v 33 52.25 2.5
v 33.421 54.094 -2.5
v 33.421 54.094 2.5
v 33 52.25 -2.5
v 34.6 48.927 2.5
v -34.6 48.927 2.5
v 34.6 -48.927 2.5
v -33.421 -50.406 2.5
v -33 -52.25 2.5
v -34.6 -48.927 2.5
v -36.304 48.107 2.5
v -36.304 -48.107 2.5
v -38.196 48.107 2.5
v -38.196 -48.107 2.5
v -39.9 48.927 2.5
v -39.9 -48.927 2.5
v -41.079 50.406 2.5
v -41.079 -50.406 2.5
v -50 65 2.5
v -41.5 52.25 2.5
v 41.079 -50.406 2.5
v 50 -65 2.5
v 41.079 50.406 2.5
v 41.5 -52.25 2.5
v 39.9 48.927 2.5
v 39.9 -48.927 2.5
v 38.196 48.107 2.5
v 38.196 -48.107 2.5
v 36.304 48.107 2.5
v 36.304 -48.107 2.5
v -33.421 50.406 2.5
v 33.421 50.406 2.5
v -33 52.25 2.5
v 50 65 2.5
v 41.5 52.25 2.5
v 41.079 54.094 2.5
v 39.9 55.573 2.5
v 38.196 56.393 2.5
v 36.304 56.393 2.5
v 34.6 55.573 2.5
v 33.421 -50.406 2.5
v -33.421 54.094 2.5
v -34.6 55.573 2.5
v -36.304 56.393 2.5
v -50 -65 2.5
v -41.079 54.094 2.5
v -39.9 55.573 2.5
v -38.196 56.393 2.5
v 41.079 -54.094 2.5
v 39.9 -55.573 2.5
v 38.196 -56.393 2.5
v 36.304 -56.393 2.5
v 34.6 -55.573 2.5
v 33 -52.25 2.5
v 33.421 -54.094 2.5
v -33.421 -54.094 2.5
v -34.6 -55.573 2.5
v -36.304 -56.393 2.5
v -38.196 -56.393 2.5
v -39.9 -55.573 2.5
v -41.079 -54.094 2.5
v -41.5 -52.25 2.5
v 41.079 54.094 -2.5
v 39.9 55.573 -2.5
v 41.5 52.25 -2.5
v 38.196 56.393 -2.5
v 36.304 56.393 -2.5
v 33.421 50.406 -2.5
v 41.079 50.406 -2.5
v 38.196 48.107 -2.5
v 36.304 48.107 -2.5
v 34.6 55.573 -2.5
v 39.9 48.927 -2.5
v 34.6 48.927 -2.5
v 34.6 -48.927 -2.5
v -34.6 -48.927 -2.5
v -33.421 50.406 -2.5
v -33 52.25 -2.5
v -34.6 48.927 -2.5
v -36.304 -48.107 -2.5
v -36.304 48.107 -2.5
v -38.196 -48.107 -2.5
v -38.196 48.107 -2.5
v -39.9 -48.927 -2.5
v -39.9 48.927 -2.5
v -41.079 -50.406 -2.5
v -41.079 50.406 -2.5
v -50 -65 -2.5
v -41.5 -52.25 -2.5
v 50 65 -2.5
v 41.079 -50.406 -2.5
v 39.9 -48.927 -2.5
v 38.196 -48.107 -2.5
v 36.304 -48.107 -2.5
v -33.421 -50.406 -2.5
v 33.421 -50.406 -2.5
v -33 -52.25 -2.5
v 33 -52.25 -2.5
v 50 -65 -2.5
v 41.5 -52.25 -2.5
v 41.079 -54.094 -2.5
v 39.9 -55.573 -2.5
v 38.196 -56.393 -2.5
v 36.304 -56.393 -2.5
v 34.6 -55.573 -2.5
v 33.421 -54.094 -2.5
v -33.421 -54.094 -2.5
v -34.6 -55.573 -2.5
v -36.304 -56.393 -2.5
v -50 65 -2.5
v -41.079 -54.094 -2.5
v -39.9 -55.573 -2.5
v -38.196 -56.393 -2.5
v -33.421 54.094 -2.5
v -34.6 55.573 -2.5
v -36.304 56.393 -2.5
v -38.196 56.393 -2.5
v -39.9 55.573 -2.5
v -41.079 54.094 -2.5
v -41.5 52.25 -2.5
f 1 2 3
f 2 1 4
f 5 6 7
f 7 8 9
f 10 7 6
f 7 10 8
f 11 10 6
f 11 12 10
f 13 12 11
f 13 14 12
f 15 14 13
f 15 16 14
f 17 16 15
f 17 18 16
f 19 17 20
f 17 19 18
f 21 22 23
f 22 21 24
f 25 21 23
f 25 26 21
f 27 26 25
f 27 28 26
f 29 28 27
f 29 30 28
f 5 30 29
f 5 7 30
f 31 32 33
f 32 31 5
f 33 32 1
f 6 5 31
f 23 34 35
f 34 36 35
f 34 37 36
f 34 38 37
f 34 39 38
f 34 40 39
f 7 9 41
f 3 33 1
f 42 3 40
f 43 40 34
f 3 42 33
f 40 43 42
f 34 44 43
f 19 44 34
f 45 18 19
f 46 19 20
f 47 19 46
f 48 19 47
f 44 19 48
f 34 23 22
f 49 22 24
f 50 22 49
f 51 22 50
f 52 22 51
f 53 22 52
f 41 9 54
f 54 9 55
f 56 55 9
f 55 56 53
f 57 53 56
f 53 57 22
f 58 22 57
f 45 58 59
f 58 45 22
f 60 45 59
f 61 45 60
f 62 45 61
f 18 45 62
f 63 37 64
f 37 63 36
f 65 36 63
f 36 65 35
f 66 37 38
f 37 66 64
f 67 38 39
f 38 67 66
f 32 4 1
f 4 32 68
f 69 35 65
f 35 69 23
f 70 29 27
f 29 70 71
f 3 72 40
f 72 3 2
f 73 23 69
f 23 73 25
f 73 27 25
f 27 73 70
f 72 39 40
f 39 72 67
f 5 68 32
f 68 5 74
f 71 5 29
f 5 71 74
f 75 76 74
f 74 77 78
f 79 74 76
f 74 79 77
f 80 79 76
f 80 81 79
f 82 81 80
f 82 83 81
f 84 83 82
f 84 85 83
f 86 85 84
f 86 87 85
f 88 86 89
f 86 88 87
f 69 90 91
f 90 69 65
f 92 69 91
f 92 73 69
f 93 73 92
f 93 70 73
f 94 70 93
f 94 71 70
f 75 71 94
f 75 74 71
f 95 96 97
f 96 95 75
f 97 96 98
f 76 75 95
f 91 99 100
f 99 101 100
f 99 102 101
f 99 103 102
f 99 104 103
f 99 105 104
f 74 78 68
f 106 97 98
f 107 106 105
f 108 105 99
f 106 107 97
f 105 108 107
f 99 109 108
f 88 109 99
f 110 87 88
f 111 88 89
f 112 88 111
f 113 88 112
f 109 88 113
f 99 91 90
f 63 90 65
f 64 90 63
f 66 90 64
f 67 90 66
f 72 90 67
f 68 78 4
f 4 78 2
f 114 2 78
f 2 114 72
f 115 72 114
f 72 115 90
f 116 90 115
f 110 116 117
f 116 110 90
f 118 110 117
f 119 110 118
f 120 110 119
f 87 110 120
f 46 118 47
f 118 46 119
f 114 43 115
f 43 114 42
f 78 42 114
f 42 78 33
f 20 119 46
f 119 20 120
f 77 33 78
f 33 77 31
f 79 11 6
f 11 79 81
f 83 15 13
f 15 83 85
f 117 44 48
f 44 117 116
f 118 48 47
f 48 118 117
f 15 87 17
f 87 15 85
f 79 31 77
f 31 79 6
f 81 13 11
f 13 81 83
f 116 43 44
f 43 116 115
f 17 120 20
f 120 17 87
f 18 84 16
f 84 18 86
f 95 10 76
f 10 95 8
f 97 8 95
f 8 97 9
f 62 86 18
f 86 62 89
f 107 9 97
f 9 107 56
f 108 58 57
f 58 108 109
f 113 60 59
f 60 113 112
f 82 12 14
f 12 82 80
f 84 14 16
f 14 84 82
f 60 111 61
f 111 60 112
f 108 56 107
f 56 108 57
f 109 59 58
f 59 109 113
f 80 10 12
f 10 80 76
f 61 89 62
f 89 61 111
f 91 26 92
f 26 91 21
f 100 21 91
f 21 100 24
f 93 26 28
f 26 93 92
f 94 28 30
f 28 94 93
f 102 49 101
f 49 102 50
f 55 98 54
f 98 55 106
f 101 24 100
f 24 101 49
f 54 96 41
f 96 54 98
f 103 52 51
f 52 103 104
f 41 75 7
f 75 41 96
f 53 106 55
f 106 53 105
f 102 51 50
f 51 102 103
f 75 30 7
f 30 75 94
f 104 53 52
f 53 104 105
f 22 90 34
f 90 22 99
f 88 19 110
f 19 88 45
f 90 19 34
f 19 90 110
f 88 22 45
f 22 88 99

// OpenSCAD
// Generated by SolidPython 1.1.3 on 2023-10-11 16:42:55


difference() {
	cube(center = true, size = [100, 130.0000000000, 5]);
	union() {
		translate(v = [37.2500000000, 52.2500000000]) {
			cylinder(center = true, h = 5, r = 4.2500000000);
		}
		translate(v = [-37.2500000000, 52.2500000000]) {
			cylinder(center = true, h = 5, r = 4.2500000000);
		}
		translate(v = [-37.2500000000, -52.2500000000]) {
			cylinder(center = true, h = 5, r = 4.2500000000);
		}
		translate(v = [37.2500000000, -52.2500000000]) {
			cylinder(center = true, h = 5, r = 4.2500000000);
		}
	}
}
/***********************************************
*********      SolidPython code:      **********
************************************************
 
import solid
import numbers
import pudb
from solid.utils import *
import viewscad
import subprocess
import os
import os.path as osp
import math
import sys

chamfer_extrude=solid.import_scad("./chamfer_extrude.scad")
chamfer_extrude=chamfer_extrude.chamfer_extrude
r = viewscad.Renderer(width=800, height=800)

def debug(model,f_name,path="/home/ts/code/projects/mfd/designs/debug"):
    solid.scad_render_to_file(model,osp.join(path,f_name)+".scad")
#generate position list of wells using offset from center
wells_pos_from_center_4 = lambda offset: [[-offset,offset],
                                        [offset, offset],
                                        [-offset, -offset],
                                        [offset, -offset]]
#wells_pos_from_center_2 = lambda offset: [[0,offset],
#                                        [0, -offset]]
wells_pos_from_center_2 = lambda offset: [[offset,0],
                                        [-offset,0]]

def make_well(dims,shape=None,height=None,dxf=False):
    def circle_cylinder():
        if dxf or (height is None):
            well = solid.circle(r=dims, segments=64)
        else:
            well = solid.cylinder(r=dims, h=height, segments=64, center = True)
        return well
    if dims is None:
        sys.exit("radius needs to be a number")
    if isinstance(dims, numbers.Number):
        well =circle_cylinder()
    elif len(dims)==1:
        if isinstance(dims[1], numbers.Number):
            well =circle_cylinder()
        else:
            sys.exit("radius needs to be a number")
    elif len(dims)==2:
        well = solid.square(dims,center = True)
    elif len(dims)==3:
        well = solid.cube(dims, center = True)
    return well

def wells_top_bottom(center_gap,device_dims=None,shape=None,height=None, positions = None, dxf = False):
    well_shape = make_well(device_dims,shape=shape,height=height,dxf=dxf)
    wells = []
    if positions is None:
        offset = radius+radius/2.0
        positions = wells_pos_from_center_2(offset)
    if dxf or (height is None):
        height = 0
    for position in positions:
        if dxf:
            wells.append(solid.translate([position[0],position[1]])(well_shape))
        else:
            wells.append(solid.translate([position[0],position[1],height/2.0])(well_shape))
    return  union()(*wells)

#place wells in four corners 
def four_corner(radius,height=None, positions = None, dxf = False):
    #if well pos not specified set
    #to equally spaced by half radius
    if positions is None:
        offset = radius+radius/2.0
        positions = wells_pos_from_center_4(offset)
    if dxf or (height is None):
        height = 0
    #make wells at positions with specified radius and height
    wells = []
    for position in positions:
        #make circle if making dxf
        if dxf:
            well_shape = solid.circle(r=radius, segments=64)
            well_shape = solid.translate([position[0],position[1]])(well_shape)
        #if stl make cylinder
        else:
            well_shape = solid.cylinder(r=radius, h=height, segments=64, center = True)
            well_shape = solid.translate([position[0],position[1],height/2.0])(well_shape)
        wells.append(well_shape)
    return  union()(*wells)

#generate channels 
def make_channels(length,width,height=0,num_chans=1,max_chans=None,spacing=None, dxf = False,
                  rotate_channels=False):
    if dxf or (height is None):
        height = 0
    #if channel gap not defined, is equal to
    if spacing is None: spacing = width
    #calculate number of channels if fitting max num within given width
    if not max_chans is None:
        import math
        num_chans = math.floor((max_chans-spacing)/(width+spacing))
    #get total width of channel section  
    total_width = (width*num_chans)+(spacing*(num_chans-1))

    #make template channel
    #if rotate_channels: width, length = length, width
    if dxf:
        channel_t = solid.square([length,width],center = True)
    else:
        channel_t = solid.cube([length,width,height], center = True)

    #if number channels is even, offset the first channel to center its gap
    if num_chans % 2 == 0: centering = -(width/2.0+spacing/2.0)
    else: centering = 0
    #move template channel up to align bottom at z = 0 
    #and offset center if necessary
    if dxf:
        channel_t = solid.translate([0,centering])(channel_t)
    else:
        channel_t = solid.translate([0,centering,height/2.0])(channel_t)

    #if rotate_channels: length,width = width,length
    #start making the channels
    channels = []
    for i in range(num_chans):
        #if i=0 there is no translation
        #if i=1, we make the first channel adjacent to second
        direction = i

        #if i>=1, we add channels alternating left and right
        if i >= 1:
            direction = -(i/2.0)
            if i % 2 == 1: direction = (-direction)+0.5
                
        #make channel at right position and add it to channel list
        translation_coords = [0,direction*(width+spacing)]
        #if rotate_channels: translation_coords = [direction*(width+spacing),0]
        if dxf:
            channel = solid.translate(translation_coords)(channel_t)
        else:
            channel = solid.translate([*translation_coords,0])(channel_t)
        channels.append(channel)
    
    #group all channels as one object
    channels = union()(*channels)
    #compute the x,y,z dimensions in order to pass as arguments 
    #for construction of other parts of device (such as the chambers)
    measurements = {'x':(length/2.0,-length/2.0),
                    'y':(total_width/2.0,-total_width/2.0)}
    if not dxf:
        measurements['z'] = (height,0)
    if rotate_channels:
        channels = solid.rotate(90)(channels)
        measurements['x'],measurements['y']=measurements['y'],measurements['x']
    return channels,measurements

def make_chambers(msrs,height=None,extra=0,len_until=None,width=None, dxf = False):
    #computes x,y,z length
    total = lambda x : abs(x[0]) + abs(x[1])
    
    #if specific height if specified
    #otherwise use same height as channels
    if dxf:
        pass
    elif not height is None:
        msrs['z'] = (height,0)
    else:
        msrs['z'] = (0,0)
        
    #make copy of measurements from channels to modify chamber dimensions 
    #and add length to chambers as specified
    chamber_dims = msrs.copy()
    #calculate length of chamber to reach specified offset
    if not len_until is None:
        chamber_len = len_until-(msrs['x'][0])
    #or add specified length to channel length (if not specified, adds 0)
    else:
        chamber_len = msrs['x'][0]+extra
    #set the chamber length based 
    chamber_dims['x'] = (chamber_len/2.0,-(chamber_len/2.0))
    #compute final dimensions of chamber
    if not width is None:
        chamber_dims['y'] = (width/2.0,-width/2.0)
    chamber_dims = [total(size) for size in chamber_dims.values()]
        
    #calculate chamber translation offset to place adjacent to channels
    chamber_trslt = msrs['x'][0]+(chamber_len/2.0)
    #compute chamber translation coordinates to align with channels
    #x = 1 moves chamber above channels
    #x = -1 moves chamber below channels
    if dxf:
        trslt = lambda x : [x*(chamber_trslt),0]
    else:
        trslt = lambda x : [x*(chamber_trslt),0,msrs['z'][0]/2.0]
    
    #function to make chamber at top or at bottom 
    if dxf:
        move = lambda x : solid.translate(trslt(x))(solid.square(chamber_dims, center = True) )
    else:
        move = lambda x : solid.translate(trslt(x))(solid.cube(chamber_dims,center = True))
    #make top and bottom chambers and return them as grouped
    top = move(1)
    bottom = move(-1)
    #chambers=solid.rotate(90)(solid.union()(top,bottom))
    chambers=(solid.union()(top,bottom))

    return chambers

#create alignment features 
def alignment_features(unit,dims,grid_size, mask_size = None, alignment = "hollow", units_from_center = (2.5,2.5), corner_len=None):
    width = grid_size[0]*dims[0]
    length = grid_size[1]*dims[1]
    if mask_size is None and corner_len is None:
        corner_len = (dims[0] + dims[1]) /2 / 8
    corner = lambda thickness_div : solid.union()( solid.square([corner_len,corner_len/thickness_div],center=False), solid.square([corner_len/thickness_div,corner_len],center=False) )
    
    def make_full(thickness_div):
        thickness = corner_len/thickness_div
        tr = solid.translate([0, 0, 0 ])(solid.rotate(180)(corner(thickness_div)))
        tr = solid.translate([thickness/2,thickness/2,0])(tr)
        bl = solid.translate([0, 0, 0 ])(solid.rotate(0)(corner(thickness_div)))
        bl = solid.translate([-thickness/2,-thickness/2,0])(bl)
        return solid.union()(tr,bl)
    
    def make_hollow(thickness_div):
        thickness = corner_len/(thickness_div/2)
        inner = make_full(thickness_div)
        outer = make_full(thickness_div/2)
        hollow = outer - inner 
        return hollow
    
    center = (width /2 , length/2)
    mask_pos = lambda x,y : (center[0] + x*(float(units_from_center[0])*dims[0]), center[1] + y*(float(units_from_center[1])*dims[1]))
    positions = []
    positions.append(mask_pos(1,0))
    positions.append(mask_pos(0,1))
    positions.append(mask_pos(-1,0))
    positions.append(mask_pos(0,-1))
    make_mask = lambda mtype : make_hollow(8) if mtype == "hollow" else make_full(8)
    masks = [ solid.translate([*position,0])(make_mask(alignment)) for position in positions]
    
    solid.scad_render_to_file(solid.union()(*masks),"./designs/open_chamber/masks.scad")
    #return unit - solid.union()(*masks)
    return solid.union()(*masks,unit)

def create_outline(thickness, array, dims, grid_size,):
    width = grid_size[0]*dims[0] + thickness *2
    length = grid_size[1]*dims[1] + thickness *2
    outer = solid.translate([-thickness, -thickness,0])(solid.square([width, length]))
    return outer-array

def create_wall(wall_thickness, outline_thickness, dims, grid_size, wall_height = 2000, dxf = False):
    inner_width = grid_size[0]*dims[0] + outline_thickness *2
    inner_length = grid_size[1]*dims[1] + outline_thickness *2
    outer_width = inner_width + wall_thickness * 2
    outer_length = inner_length + wall_thickness * 2
    outer_pos_x = -outline_thickness-wall_thickness
    outer_pos_y = -outline_thickness-wall_thickness
    inner_pos_x = -outline_thickness
    inner_pos_y = -outline_thickness
    if dxf:
        inner_wall = solid.translate([inner_pos_x,
                                      inner_pos_y,
                                      0])(solid.square([inner_width, inner_length]))
        outer_wall = solid.translate([outer_pos_x,
                                      outer_pos_y,
                                      0])(solid.square([outer_width, outer_length]))

        return outer_wall-inner_wall
    else:
        inner_wall = solid.translate([inner_pos_x,
                                      inner_pos_y,
                                      0])(solid.cube([inner_width, inner_length,wall_height]))
        outer_wall = solid.translate([outer_pos_x,
                                      outer_pos_y,
                                      0])(solid.cube([outer_width, outer_length,wall_height]))

        return outer_wall-inner_wall, {'wall_height': wall_height,
                                       'wall_thickness': wall_thickness,
                                       'inner_width':inner_width,
                                       'inner_length': inner_length,
                                       'outer_width': outer_width,
                                       'outer_length': outer_length,
                                       'outer_pos_x' : outer_pos_x,
                                       'outer_pos_y' : outer_pos_y,
                                       'inner_pos_x' : inner_pos_x,
                                       'inner_pos_y' : inner_pos_y}

def create_thicker_wall(wall_thickness, outer_wall_offset, wall_dims, dims, grid_size, height_start = .2, height_end=2, dxf = False):
    addon_wall,thicker_wall_dims = create_wall(wall_thickness, outer_wall_offset, dims, grid_size, wall_height=height_end-height_start, dxf = False)
    addon_wall = solid.translate([0,0,height_start])(addon_wall)

    thicker_wall_dims['wall_height'] = height_end
    thicker_wall_dims['wall_thickness'] = wall_dims['wall_thickness'] + wall_thickness
    return addon_wall, thicker_wall_dims
 
def add_lock_to_wall(wall,wall_dims,y_offset = 0,cut_ratio=0.7,L_length=3, gap_ratio=0.05, axis="x",width_ratio=1/2):
    # Makes L shape
    def make_L(max_length,length_thickness,max_width,width_thickness,height,y_offset):
        length = solid.cube([max_length,length_thickness,height])
        width = solid.cube([width_thickness,max_width,height])
        width = solid.translate([max_length-(width_thickness),0,0])(width)
        L = solid.union()(width,length)
        debug(L,"L")
        if axis == "x":
            L = solid.rotate(-90)(L)
            L = solid.translate([0,max_length,0])(L)
        else:
            L = solid.rotate(-180)(L)
            L = solid.translate([max_length,max_width,0])(L)
        return solid.translate([0,0,y_offset])(L)
    
    lock_length = L_length
    lock_width = wall_dims['wall_thickness']*width_ratio
    lock_length_thickness = lock_width/2
    lock_width_thickness = lock_width/2
    L_lock = make_L(lock_length,lock_length_thickness,lock_width,lock_width_thickness, wall_dims['wall_height']-y_offset, y_offset)
    
    margin_space = lock_length - lock_length*(1-gap_ratio)
    key_length = lock_length-margin_space
    key_length_thickness = lock_length_thickness-(margin_space*2)
    key_width = lock_width-(margin_space*2)
    key_width_thickness = lock_width_thickness-(margin_space*2)
    L_key = make_L(key_length,key_length_thickness,key_width,key_width_thickness, wall_dims['wall_height']-y_offset, y_offset)
    L_key = solid.translate([margin_space,margin_space,0])(L_key)
    L = solid.union()(L_lock,L_key)
    debug(L,"L")
    
    #Make cube to be used as negative to split frame in a half
    #Can choose if making left or right negative, specify ratio of split
    def make_negative(right,cut_ratio):
        if axis == "x":
            if right:
                length = wall_dims['outer_length']*(1-cut_ratio)
                pos_x = wall_dims['outer_pos_x']+(wall_dims['outer_length']*cut_ratio)
            else:
                length = wall_dims['outer_length']*(cut_ratio)
                pos_x = wall_dims['outer_pos_x'] 
            negative = solid.cube([wall_dims['outer_width'],length, wall_dims['wall_height']])
            negative = solid.translate([wall_dims['outer_pos_y'],pos_x,0])(negative)
        else:
            if right:
                length = wall_dims['outer_width']*(1-cut_ratio)
                pos_x = wall_dims['outer_pos_y']+(wall_dims['outer_width']*cut_ratio)
            else:
                length = wall_dims['outer_width']*(cut_ratio)
                pos_x = wall_dims['outer_pos_y'] 
            negative = solid.cube([length,wall_dims['outer_length'], wall_dims['wall_height']])
            negative = solid.translate([pos_x,wall_dims['outer_pos_x'],0])(negative)
        return negative, pos_x, length 
                      
    #Make negatives
    negative_right, right_half_pos_x, right_half_length = make_negative(True,cut_ratio)
    negative_left, left_half_pos_x, right_half_length = make_negative(False,cut_ratio)
    #Make halves
    left_half = solid.difference()(wall,negative_right)
    right_half = solid.difference()(wall,negative_left)
    def place_L(L, L_length,L_width):
        #Place L on top wall       
        offset_to_center = (wall_dims['wall_thickness']-L_width)/2
        if axis == "x":
            y_pos_top = (wall_dims['outer_pos_y'] +
                    wall_dims['outer_width'] - 
                    L_width - offset_to_center)
            top_L = solid.translate([y_pos_top,
                                     right_half_pos_x-(L_length),
                                     0])(L)
            #Place L on bottom wall       
            y_pos_bottom = wall_dims['outer_pos_y']+offset_to_center
            bottom_L = solid.translate([y_pos_bottom,
                                        right_half_pos_x-L_length,
                                        0])(L)
        else:
            y_pos_top = (wall_dims['outer_pos_x'] +
                    wall_dims['outer_length'] -
                    (L_width+offset_to_center))
            top_L = solid.translate([right_half_pos_x-L_length,
                                     y_pos_top,
                                     0])(L)
            #Place L on bottom wall       
            y_pos_bottom = wall_dims['outer_pos_y']+offset_to_center
            bottom_L = solid.translate([right_half_pos_x-L_length,
                                        y_pos_bottom,
                                        0])(L)
        return bottom_L, top_L
    #Make complimentary L pieces through union and differences
    #Make Lock
    bottom_L_lock, top_L_lock = place_L(L_lock,L_length,lock_width)
    left_half = solid.difference()(left_half,bottom_L_lock)
    left_half = solid.difference()(left_half,top_L_lock)
    #Make Key
    bottom_L_key, top_L_key = place_L(L_key,L_length,lock_width)
    right_half = solid.union()(right_half,bottom_L_key)
    right_half = solid.union()(right_half,top_L_key)
    return left_half, right_half


#build a row x col grid of containment units
def make_unit_array(unit,dims,grid_size, dxf = False, alignment = None, mask_size = None,
                    units_from_center = None,alignment_offset=None, alignment_mark_size=1):
    units = []
    for col in range(grid_size[1]):
        for row in range(grid_size[0]):
            if dxf:
                units.append(solid.translate([row*dims[0],col*dims[1]])(unit))
            else:
                units.append(solid.translate([row*dims[0],col*dims[1],dims[2]/2.0])(unit))
    array = solid.union()(*units)
    if (not alignment is None) and dxf:
        if not alignment_offset is None:
            array = solid.translate([alignment_offset[0],alignment_offset[1]])(array)
        array = alignment_features(array,dims, grid_size, alignment = alignment, mask_size = None, units_from_center = units_from_center,corner_len=alignment_mark_size)
        if not alignment_offset is None:
            array = solid.translate([-alignment_offset[0],-alignment_offset[1]])(array)
    return array


def make_taylor(wells_pos = wells_pos_from_center_4(2.25), well_rad = 1.5 ,
                well_height = 2, chan_w = 0.01, chan_l = 1, chan_h = 0.010 ,
                chan_gap = 0.040, max_chans = None,num_chans=100, chamber_height  = 0.100,
                columns = 1, rows = 1, chamber_len_until=2.25, add_channels = True, add_wells = True, 
                add_chambers = True, save_path = "./", alignment = None, units_from_center = 2,
                mask_size = None, render_stl = False, outline_thickness = 0.050, dxf = True,
                wall_height = 15, wall_thickness = 0.95, casing_x=9, casing_y=9, casing_z=0,rotate_units=0):

    dims = [casing_x, casing_y, casing_z]
    wells = four_corner(well_rad,well_height, dxf = dxf, positions = wells_pos)
    debug(wells,"wells")
    channels, msrs = make_channels(chan_l,chan_w,chan_h,dxf=dxf, spacing = chan_gap, max_chans=max_chans,num_chans=num_chans)
    debug(channels,"channels")
    chambers = make_chambers(msrs,dxf = dxf, height=chamber_height,len_until=chamber_len_until)
    debug(chambers,"chambers")

    #add together and render
    device_parts = []
    if add_channels:
        device_parts.append(channels)
    if add_wells:
        device_parts.append(wells)
    if add_chambers:
        device_parts.append(chambers)
    device=union()(*device_parts)
    device = rotate(rotate_units)(device)

    device=solid.translate([dims[0]/2.0,dims[1]/2.0,0])(device)
    channels = rotate(rotate_units)(channels)
    channels=solid.translate([dims[0]/2,dims[1]/2,0])(channels)
    chambers_wells = union()(wells,chambers)
    chambers_wells = rotate(rotate_units)(chambers_wells)
    chambers_wells=solid.translate([dims[0]/2,dims[1]/2,0])(chambers_wells)

    file_name = str(rows)+'x'+str(columns)+'_units_'
    grid_size = [rows,columns]

    if alignment:
        alignment="full"
    device = make_unit_array(device,dims,grid_size, dxf=dxf, alignment = alignment,
                                 units_from_center = units_from_center)
    channels = make_unit_array(channels,dims,grid_size, dxf=dxf, alignment = alignment,
                                 units_from_center = units_from_center)
    if alignment=="full":
        alignment="hollow"

    chambers_wells = make_unit_array(chambers_wells,dims,grid_size, dxf=dxf, alignment = alignment,
                                 units_from_center =units_from_center)

    def save_model(model,prefix):
        model_fname = os.path.abspath(save_path+prefix+"_"+file_name+".scad")
        solid.scad_render_to_file(model,model_fname)
        return model_fname

    wells_fname = save_model(wells,"wells")
    channels_fname = save_model(channels,"channels")
    device_fname = save_model(device,"device")
    chambers_wells_fname = save_model(chambers_wells,"chambers_wells")
    return (chambers_wells,chambers_wells_fname), (channels,channels_fname), (device,device_fname)

def make_device(design='open',rows=8,columns=6,wells_pos = 4.5,well_offset=3.2, well_rad=3.2,well_height=0.1,
                chan_l=1,chan_w=0.01,chan_h=0.01,chan_gap=0.015,num_chans=101,dxf=True,save_path="./designs/open_chamber/",
                casing_x=9.0,casing_y=18.0,casing_z=0,rotate_units=90,units_from_center=(3,1),chamber_len_until=4.5,
                chamber_width=None,alignment=True, add_wells=True, add_channels=True,add_chambers=True):

    dims = [casing_x, casing_y, casing_z]
    if design == "open":
        wells_pos=wells_pos_from_center_2(wells_pos)
        wells = wells_top_bottom(well_offset*2,device_dims=well_rad,height=well_height, dxf = dxf, positions = wells_pos)
    elif design == "closed":
        wells_pos=wells_pos_from_center_4(wells_pos)
        debug(wells,"wells")
        wells = four_corner(well_offset,well_heightdevice_dims=well_rad, dxf = dxf, positions = wells_pos)
    else:
        print(design+" is not a valid design.\n Choose valid design: 'open' or 'closed'")
        exit()
    wells = rotate(rotate_units)(wells)
    wells=solid.translate([dims[0]/2,dims[1]/2,0])(wells)
    debug(wells,"wells")

    channels, msrs = make_channels(chan_l,chan_w,chan_h,dxf=dxf, spacing = chan_gap, num_chans=num_chans,rotate_channels=False)
    channels = rotate(rotate_units)(channels)
    channels=solid.translate([dims[0]/2,dims[1]/2,0])(channels)

    chambers=make_chambers(msrs,height=None,extra=0,len_until=chamber_len_until, width=chamber_width,dxf = dxf)
    chambers = rotate(rotate_units)(chambers)
    chambers=solid.translate([dims[0]/2,dims[1]/2,0])(chambers)

    device_parts = []
    if add_channels:
        device_parts.append(channels)
    if add_wells:
        device_parts.append(wells)
    if add_chambers:
        device_parts.append(chambers)
    device = union()(*device_parts)
    #device = rotate(rotate_units)(device)
    #device=solid.translate([dims[0]/2.0,dims[1]/2.0,0])(device)

    chambers_wells = []
    if add_chambers:
        chambers_wells.append(chambers)
    if add_wells:
        chambers_wells.append(wells)
    chambers_wells = union()(*chambers_wells)
    #chambers_wells = union()(wells,chambers)
    #chambers_wells = rotate(rotate_units)(chambers_wells)
    #chambers_wells=solid.translate([dims[0]/2,dims[1]/2,0])(chambers_wells)

    file_name = str(rows)+'x'+str(columns)+'_units_'

    grid_size = [rows,columns]
    if alignment:
        alignment="full"
    device = make_unit_array(device,dims,grid_size, dxf=dxf, alignment = alignment,
                                 units_from_center = units_from_center)
    channels = make_unit_array(channels,dims,grid_size, dxf=dxf, alignment = alignment,
                                 units_from_center = units_from_center)
    if alignment=="full":
        alignment="hollow"

    chambers_wells = make_unit_array(chambers_wells,dims,grid_size, dxf=dxf, alignment = alignment,
                                 units_from_center =units_from_center)

    def save_model(model,prefix):
        model_fname = os.path.abspath(save_path+prefix+"_"+file_name+".scad")
        solid.scad_render_to_file(model,model_fname)
        return model_fname

    wells_fname = save_model(wells,"wells")
    channels_fname = save_model(channels,"channels")
    device_fname = save_model(device,"device")
    chambers_wells_fname = save_model(chambers_wells,"chambers_wells")
    return (chambers_wells,chambers_wells_fname), (channels,channels_fname), (device,device_fname)


def make_open_chamber(rows=8,columns=6,wells_pos = wells_pos_from_center_2(4.5), well_rad=3.2,well_height=0.1,
                      chan_l=1,chan_w=0.01,chan_h=0.01,chan_gap=0.015,num_chans=101,dxf=True,save_path="./designs/open_chamber/",
                      casing_x=9.0,casing_y=18.0,casing_z=0,rotate_units=90,units_from_center=(3,1),chamber_len_until=4.5,
                      chamber_width=None,alignment=True, add_wells=True, add_channels=True,add_chambers=True):

    dims = [casing_x, casing_y, casing_z]
    wells = wells_top_bottom(well_rad,height=well_height, dxf = dxf, positions = wells_pos)
    channels, msrs = make_channels(chan_l,chan_w,chan_h,dxf=dxf, spacing = chan_gap, num_chans=num_chans,rotate_channels=False)
    chambers=make_chambers(msrs,height=None,extra=0,len_until=chamber_len_until, width=chamber_width,dxf = dxf)
    debug(chambers,"chambers")
    device_parts = []
    if add_channels:
        device_parts.append(channels)
    if add_wells:
        device_parts.append(wells)
    if add_chambers:
        device_parts.append(chambers)
    device = union()(*device_parts)
    device = rotate(rotate_units)(device)
    device=solid.translate([dims[0]/2.0,dims[1]/2.0,0])(device)
    channels = rotate(rotate_units)(channels)
    channels=solid.translate([dims[0]/2,dims[1]/2,0])(channels)
    chambers_wells = union()(wells,chambers)
    chambers_wells = rotate(rotate_units)(chambers_wells)
    chambers_wells=solid.translate([dims[0]/2,dims[1]/2,0])(chambers_wells)

    file_name = str(rows)+'x'+str(columns)+'_units_'

    grid_size = [rows,columns]
    if alignment:
        alignment="full"
    device = make_unit_array(device,dims,grid_size, dxf=dxf, alignment = alignment,
                                 units_from_center = units_from_center)
    channels = make_unit_array(channels,dims,grid_size, dxf=dxf, alignment = alignment,
                                 units_from_center = units_from_center)
    if alignment=="full":
        alignment="hollow"

    chambers_wells = make_unit_array(chambers_wells,dims,grid_size, dxf=dxf, alignment = alignment,
                                 units_from_center =units_from_center)

    def save_model(model,prefix):
        model_fname = os.path.abspath(save_path+prefix+"_"+file_name+".scad")
        solid.scad_render_to_file(model,model_fname)
        return model_fname

    wells_fname = save_model(wells,"wells")
    channels_fname = save_model(channels,"channels")
    device_fname = save_model(device,"device")
    chambers_wells_fname = save_model(chambers_wells,"chambers_wells")
    return (chambers_wells,chambers_wells_fname), (channels,channels_fname), (device,device_fname)

def to_dxf(scad_path):
    dxf_path = scad_path.replace(".scad",".dxf")
    subprocess.call(["openscad", "-o", dxf_path, scad_path])
    import ezdxf
    temp_dxf = ezdxf.readfile(dxf_path)
    temp_dxf.saveas(dxf_path)

#def make_walls(diameter,thickness,grid_size,dims,height=20,segments=256,make_inner=True):
#    wafer_wall_out = solid.cylinder(r=diameter/2,h=height, segments=segments)
#    wafer_wall_in = solid.cylinder(r=(diameter/2-thickness),h=height, segments=segments)
#    wafer_wall = solid.difference()(wafer_wall_out,wafer_wall_in)
#    wafer_wall = solid.translate([grid_size[1]*dims[1]/2.0,grid_size[0]*dims[0]/2.0])(wafer_wall)
#
#    vertical_wall_length = grid_size[1]*dims[1]
#    horizontal_wall_length = grid_size[0]*dims[0]
#    vertical_wall = solid.cube([vertical_wall_length,thickness,height],center = True)
#    vertical_wall = solid.translate([vertical_wall_length/2,0,height/2])(vertical_wall)
#    horizontal_wall = solid.cube([thickness,horizontal_wall_length,height],center = True)
#    horizontal_wall = solid.translate([0,vertical_wall_length/2,height/2])(horizontal_wall)
#    walls = []
#    walls.append(horizontal_wall)
#    walls.append(vertical_wall)
#    for col in range(grid_size[1]):
#        if col == grid_size[1]-1: 
#            walls.append(solid.translate([0,(col+1)*dims[1]])(vertical_wall))
#        elif col > 0 and col < grid_size[1]-1 and make_inner==True:
#            walls.append(solid.translate([0,(col+1)*dims[1]])(vertical_wall))
#    for row in range(grid_size[0]):
#        if row == grid_size[0]-1: 
#            walls.append(solid.translate([(row+1)*dims[0],0])(horizontal_wall))
#        elif row > 0 and row < grid_size[0]-1 and make_inner==True:
#            walls.append(solid.translate([(row+1)*dims[0],0])(horizontal_wall))
#    walls = union()(*walls)
#    wafer_walls = union()(walls,wafer_wall)
#    return walls,wafer_wall,wafer_walls

def make_walls(diameter,thickness,grid_size,dims,height=20,segments=256,make_inner=True,padx=0,pady=0):
    wafer_wall_out = solid.cylinder(r=diameter/2,h=height, segments=segments)
    wafer_wall_in = solid.cylinder(r=(diameter/2-thickness),h=height, segments=segments)
    wafer_wall = solid.difference()(wafer_wall_out,wafer_wall_in)
    wafer_wall = solid.translate([grid_size[1]*dims[1]/2.0,grid_size[0]*dims[0]/2.0])(wafer_wall)

    vertical_wall_length = grid_size[0]*dims[0]+padx
    horizontal_wall_length = grid_size[1]*dims[1]+pady
    vertical_wall = solid.cube([vertical_wall_length,thickness,height],center = True)
    vertical_wall = solid.translate([vertical_wall_length/2-pady/2,-padx/2,height/2])(vertical_wall)
    horizontal_wall = solid.cube([thickness,horizontal_wall_length,height],center = True)
    horizontal_wall = solid.translate([-pady/2,horizontal_wall_length/2-padx/2,height/2])(horizontal_wall)
    walls = []
    walls.append(horizontal_wall)
    walls.append(vertical_wall)
    for col in range(grid_size[1]):
        if col == grid_size[1]-1: 
            walls.append(solid.translate([0,(col+1)*dims[1]+pady])(vertical_wall))
        elif col > 0 and col < grid_size[1]-1 and make_inner==True:
            walls.append(solid.translate([0,(col+1)*dims[1]])(vertical_wall))
    for row in range(grid_size[0]):
        if row == grid_size[0]-1: 
            walls.append(solid.translate([(row+1)*dims[0]+padx,0])(horizontal_wall))
        elif row > 0 and row < grid_size[0]-1 and make_inner==True:
            walls.append(solid.translate([(row+1)*dims[0],0])(horizontal_wall))
    walls = union()(*walls)
    wafer_walls = union()(walls,wafer_wall)
    return walls,wafer_wall,wafer_walls

def save_model(model,base_path,base_name,dxf=True):
    if not os.path.exists(base_path):
        os.makedirs(base_path)
    dxf_path=osp.join(base_path,base_name+".scad")
    solid.scad_render_to_file(model,osp.join(dxf_path))
    if dxf:
        to_dxf(dxf_path)

def make_wafer(diameter,flat_len,thickness):
    wafer = solid.cylinder(r1=diameter/2,r2=diameter/2,h=thickness,segments=512,)()
    x_start_flat=(flat_len/2)
    y_start_flat = math.sqrt(((diameter/2)**2) - (x_start_flat**2) )
    height_delete_flat=diameter/2-y_start_flat
    flat_delete = solid.cube([flat_len,height_delete_flat,thickness],center=False)()
    flat_delete = solid.translate([-flat_len/2,y_start_flat,0])(flat_delete)
    wafer = solid.difference()(wafer,flat_delete)
    wafer = solid.rotate(90)(wafer)
    return wafer

def add_wafer_to_mask(wafer_size,flat_len,mask,grid_size,dims,wafer_line_thickness=0.1,outer_mask_thickness=5,alignment_offset=None):
    def make_wafer_mask(wafer_size,flat_len):
        wafer_mask = make_wafer(wafer_size,flat_len,1)
        wafer_mask = solid.projection()(wafer_mask)
        wafer_mask = solid.translate([grid_size[0]*dims[0]/2.0,grid_size[1]*dims[1]/2.0])(wafer_mask)
        if not alignment_offset is None:
            wafer_mask = solid.translate([-alignment_offset[0],-alignment_offset[1]])(wafer_mask)
        return wafer_mask

    inner_wafer_line_mask = make_wafer_mask(wafer_size-wafer_line_thickness/2,flat_len)
    outer_wafer_line_mask = make_wafer_mask(wafer_size+wafer_line_thickness/2,flat_len)
    outer_wafer_mask = make_wafer_mask(wafer_size+outer_mask_thickness,flat_len)
    outer_wafer_mask = solid.difference()(outer_wafer_mask,outer_wafer_line_mask)
    wafer_mask = solid.union()(outer_wafer_mask,inner_wafer_line_mask)

    return solid.difference()(wafer_mask,mask)

def make_posts(post_shape,post_height):
    posts = solid.linear_extrude(height=post_height)(post_shape)
    return posts

def make_wafer_empty(diameter,flat_len,thickness,margin,notch_len=20,notch_height=5,oversize=1.01):
    diameter*=oversize
    flat_len*=oversize
    wafer = make_wafer(diameter,flat_len,thickness)
    holder = solid.cylinder(r1=diameter/2+margin,r2=diameter/2+margin,h=thickness,segments=512)()
    holder = solid.difference()(holder,wafer)

    x_start_flat=(flat_len/2)
    y_start_flat = math.sqrt(((diameter/2)**2) - (x_start_flat**2) )
    height_delete_flat=diameter/2-y_start_flat
    notch = solid.cube([notch_len,notch_height,thickness],center=False)()
    notch = solid.translate([-notch_len/2,y_start_flat,0])(notch)
    notch = solid.rotate(90)(notch)
    return solid.difference()(holder,notch)

def wafer_print_calibration(diameter,thickness,height,z_offset):
    circles = []
    radii = []
    radii.append(diameter/2.0*0.8)
    radii.append(diameter/2.0*0.6)
    radii.append(diameter/2.0*0.4)
    radii.append(diameter/2.0*0.2)
    for radius in radii:
        inner = solid.cylinder(r1=radius-(thickness/2.0),r2=radius-(thickness/2.0),h=thickness,segments=512,)()
        outer = solid.cylinder(r1=radius+(thickness/2.0),r2=radius+(thickness/2.0),h=thickness,segments=512,)()
        diff = solid.difference()(outer,inner)
        circles.append(diff)
    circles = solid.union()(*circles)
    circles = solid.translate([0,0,z_offset])(circles)
    return circles

def make_rack(wells,dims,grid_size,alignment_offset,rack_x,rack_y,rack_thickness,bolt_width,add_bolts=True):

    #get X and Y dimensions of gride of pipette tips
    X_len = dims[0]*grid_size[0]
    Y_len = dims[1]*grid_size[1]
    #make rack
    rack = solid.cube([rack_x,rack_y,rack_thickness],center=True)

    if add_bolts:
    #add bolt holes
        bolt_hole=solid.cylinder(r=bolt_width/2,h=rack_thickness,center=True)()
        bolt_holes = []
        bolt_holes.append(solid.translate([rack_x/2-1.5*bolt_width,rack_y/2-1.5*bolt_width])(bolt_hole))
        bolt_holes.append(solid.translate([-rack_x/2+1.5*bolt_width,rack_y/2-1.5*bolt_width])(bolt_hole))
        bolt_holes.append(solid.translate([-rack_x/2+1.5*bolt_width,-rack_y/2+1.5*bolt_width])(bolt_hole))
        bolt_holes.append(solid.translate([rack_x/2-1.5*bolt_width,-rack_y/2+1.5*bolt_width])(bolt_hole))
        bolt_holes = solid.union()(*bolt_holes)
        rack=solid.difference()(rack,bolt_holes)
    rack_support = rack

    #center rack with pipette holes
    rack = solid.translate([0,0,rack_thickness/2])(rack)
    rack = solid.translate([X_len/2,Y_len/2])(rack)
    rack = solid.translate([-alignment_offset[0],-alignment_offset[1]])(rack)
    wells = solid.linear_extrude(height=rack_thickness)(wells)
    rack = solid.difference()(rack,wells)
    return rack, rack_support

def make_pillar(wells,dims,grid_size,alignment_offset,rack_x,rack_y,pillar_height,rack_thickness,bolt_width,add_bolts=True,taper_angle=1,bolt_position_corner=1.5):

    #get X and Y dimensions of gride of pipette tips
    X_len = dims[0]*grid_size[0]
    Y_len = dims[1]*grid_size[1]
    #make rack
    rack = solid.cube([rack_x,rack_y,rack_thickness],center=True)
    
    if add_bolts:
    #add bolt holes
        bolt_hole=solid.cylinder(r=bolt_width/2,h=rack_thickness,center=True)()
        bolt_holes = []
        bolt_holes.append(solid.translate([rack_x/2-bolt_position_corner*bolt_width,rack_y/2-bolt_position_corner*bolt_width])(bolt_hole))
        bolt_holes.append(solid.translate([-rack_x/2+bolt_position_corner*bolt_width,rack_y/2-bolt_position_corner*bolt_width])(bolt_hole))
        bolt_holes.append(solid.translate([-rack_x/2+bolt_position_corner*bolt_width,-rack_y/2+bolt_position_corner*bolt_width])(bolt_hole))
        bolt_holes.append(solid.translate([rack_x/2-bolt_position_corner*bolt_width,-rack_y/2+bolt_position_corner*bolt_width])(bolt_hole))
        bolt_holes = solid.union()(*bolt_holes)
        rack=solid.difference()(rack,bolt_holes)
    rack_support = rack

    #center rack with pipette holes
    #rack = solid.translate([0,0,-rack_thickness])(rack)
    rack = solid.translate([X_len/2,Y_len/2])(rack)
    rack = solid.translate([-alignment_offset[0],-alignment_offset[1]])(rack)
    if not taper_angle == 0:
        wells=chamfer_extrude(pillar_height,taper_angle,segments=20)(wells)
    else:
        wells = solid.linear_extrude(height=pillar_height)(wells)
    rack = solid.union()(rack,wells)
    return rack, rack_support

def deg_taper_len(height,deg):
    if not deg == 0:
        return height*math.tan(math.radians(deg))
    else:
        return 0









 
 
************************************************/
